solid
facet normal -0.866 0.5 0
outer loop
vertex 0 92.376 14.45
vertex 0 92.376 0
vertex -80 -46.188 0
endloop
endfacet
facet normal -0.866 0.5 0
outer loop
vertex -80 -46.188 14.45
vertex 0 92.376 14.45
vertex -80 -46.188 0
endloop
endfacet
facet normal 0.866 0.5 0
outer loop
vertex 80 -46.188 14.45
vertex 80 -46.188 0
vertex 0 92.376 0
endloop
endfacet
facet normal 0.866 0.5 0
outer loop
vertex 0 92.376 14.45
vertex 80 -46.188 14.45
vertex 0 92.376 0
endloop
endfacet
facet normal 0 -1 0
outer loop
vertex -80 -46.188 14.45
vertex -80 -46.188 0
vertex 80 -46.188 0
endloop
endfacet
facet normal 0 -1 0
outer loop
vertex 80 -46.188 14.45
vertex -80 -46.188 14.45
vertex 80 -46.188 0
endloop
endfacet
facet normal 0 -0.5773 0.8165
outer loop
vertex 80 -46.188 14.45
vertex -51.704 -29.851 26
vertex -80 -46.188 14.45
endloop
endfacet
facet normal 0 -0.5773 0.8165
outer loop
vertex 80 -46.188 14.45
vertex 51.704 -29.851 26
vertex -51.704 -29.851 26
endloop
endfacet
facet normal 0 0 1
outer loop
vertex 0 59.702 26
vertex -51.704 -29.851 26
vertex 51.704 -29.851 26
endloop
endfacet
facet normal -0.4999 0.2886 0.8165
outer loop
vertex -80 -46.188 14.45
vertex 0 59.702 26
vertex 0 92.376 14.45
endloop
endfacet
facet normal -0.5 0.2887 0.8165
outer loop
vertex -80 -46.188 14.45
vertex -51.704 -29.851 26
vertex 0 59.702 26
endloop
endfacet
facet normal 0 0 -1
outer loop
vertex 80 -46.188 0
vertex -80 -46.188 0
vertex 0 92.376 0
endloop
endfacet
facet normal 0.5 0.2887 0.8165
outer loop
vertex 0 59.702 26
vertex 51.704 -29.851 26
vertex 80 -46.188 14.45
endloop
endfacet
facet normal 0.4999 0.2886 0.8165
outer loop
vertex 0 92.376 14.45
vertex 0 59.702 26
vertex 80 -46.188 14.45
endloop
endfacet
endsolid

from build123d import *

# Parameters (mm, degrees)
F1_DEPTH = 26
F2_SIZE2 = 16.336822
F2_SIZE  = 11.55


with BuildPart() as f1:
    # F0 (on Top) → F1 (new body)
    with BuildSketch(Plane.XY):
        Polygon((0, 92.376043), (-80, -46.188022), (80, -46.188022), align=None)
    extrude(amount=F1_DEPTH)

    # F2
    f2_edges = [f1.edges().sort_by_distance(p)[0] for p in [
        (-40, 23.094011, 26),
        (40, 23.094011, 26),
        (0, -46.188022, 26),
    ]]
    chamfer(f2_edges, length=F2_SIZE, length2=F2_SIZE2)


solid = f1.part
